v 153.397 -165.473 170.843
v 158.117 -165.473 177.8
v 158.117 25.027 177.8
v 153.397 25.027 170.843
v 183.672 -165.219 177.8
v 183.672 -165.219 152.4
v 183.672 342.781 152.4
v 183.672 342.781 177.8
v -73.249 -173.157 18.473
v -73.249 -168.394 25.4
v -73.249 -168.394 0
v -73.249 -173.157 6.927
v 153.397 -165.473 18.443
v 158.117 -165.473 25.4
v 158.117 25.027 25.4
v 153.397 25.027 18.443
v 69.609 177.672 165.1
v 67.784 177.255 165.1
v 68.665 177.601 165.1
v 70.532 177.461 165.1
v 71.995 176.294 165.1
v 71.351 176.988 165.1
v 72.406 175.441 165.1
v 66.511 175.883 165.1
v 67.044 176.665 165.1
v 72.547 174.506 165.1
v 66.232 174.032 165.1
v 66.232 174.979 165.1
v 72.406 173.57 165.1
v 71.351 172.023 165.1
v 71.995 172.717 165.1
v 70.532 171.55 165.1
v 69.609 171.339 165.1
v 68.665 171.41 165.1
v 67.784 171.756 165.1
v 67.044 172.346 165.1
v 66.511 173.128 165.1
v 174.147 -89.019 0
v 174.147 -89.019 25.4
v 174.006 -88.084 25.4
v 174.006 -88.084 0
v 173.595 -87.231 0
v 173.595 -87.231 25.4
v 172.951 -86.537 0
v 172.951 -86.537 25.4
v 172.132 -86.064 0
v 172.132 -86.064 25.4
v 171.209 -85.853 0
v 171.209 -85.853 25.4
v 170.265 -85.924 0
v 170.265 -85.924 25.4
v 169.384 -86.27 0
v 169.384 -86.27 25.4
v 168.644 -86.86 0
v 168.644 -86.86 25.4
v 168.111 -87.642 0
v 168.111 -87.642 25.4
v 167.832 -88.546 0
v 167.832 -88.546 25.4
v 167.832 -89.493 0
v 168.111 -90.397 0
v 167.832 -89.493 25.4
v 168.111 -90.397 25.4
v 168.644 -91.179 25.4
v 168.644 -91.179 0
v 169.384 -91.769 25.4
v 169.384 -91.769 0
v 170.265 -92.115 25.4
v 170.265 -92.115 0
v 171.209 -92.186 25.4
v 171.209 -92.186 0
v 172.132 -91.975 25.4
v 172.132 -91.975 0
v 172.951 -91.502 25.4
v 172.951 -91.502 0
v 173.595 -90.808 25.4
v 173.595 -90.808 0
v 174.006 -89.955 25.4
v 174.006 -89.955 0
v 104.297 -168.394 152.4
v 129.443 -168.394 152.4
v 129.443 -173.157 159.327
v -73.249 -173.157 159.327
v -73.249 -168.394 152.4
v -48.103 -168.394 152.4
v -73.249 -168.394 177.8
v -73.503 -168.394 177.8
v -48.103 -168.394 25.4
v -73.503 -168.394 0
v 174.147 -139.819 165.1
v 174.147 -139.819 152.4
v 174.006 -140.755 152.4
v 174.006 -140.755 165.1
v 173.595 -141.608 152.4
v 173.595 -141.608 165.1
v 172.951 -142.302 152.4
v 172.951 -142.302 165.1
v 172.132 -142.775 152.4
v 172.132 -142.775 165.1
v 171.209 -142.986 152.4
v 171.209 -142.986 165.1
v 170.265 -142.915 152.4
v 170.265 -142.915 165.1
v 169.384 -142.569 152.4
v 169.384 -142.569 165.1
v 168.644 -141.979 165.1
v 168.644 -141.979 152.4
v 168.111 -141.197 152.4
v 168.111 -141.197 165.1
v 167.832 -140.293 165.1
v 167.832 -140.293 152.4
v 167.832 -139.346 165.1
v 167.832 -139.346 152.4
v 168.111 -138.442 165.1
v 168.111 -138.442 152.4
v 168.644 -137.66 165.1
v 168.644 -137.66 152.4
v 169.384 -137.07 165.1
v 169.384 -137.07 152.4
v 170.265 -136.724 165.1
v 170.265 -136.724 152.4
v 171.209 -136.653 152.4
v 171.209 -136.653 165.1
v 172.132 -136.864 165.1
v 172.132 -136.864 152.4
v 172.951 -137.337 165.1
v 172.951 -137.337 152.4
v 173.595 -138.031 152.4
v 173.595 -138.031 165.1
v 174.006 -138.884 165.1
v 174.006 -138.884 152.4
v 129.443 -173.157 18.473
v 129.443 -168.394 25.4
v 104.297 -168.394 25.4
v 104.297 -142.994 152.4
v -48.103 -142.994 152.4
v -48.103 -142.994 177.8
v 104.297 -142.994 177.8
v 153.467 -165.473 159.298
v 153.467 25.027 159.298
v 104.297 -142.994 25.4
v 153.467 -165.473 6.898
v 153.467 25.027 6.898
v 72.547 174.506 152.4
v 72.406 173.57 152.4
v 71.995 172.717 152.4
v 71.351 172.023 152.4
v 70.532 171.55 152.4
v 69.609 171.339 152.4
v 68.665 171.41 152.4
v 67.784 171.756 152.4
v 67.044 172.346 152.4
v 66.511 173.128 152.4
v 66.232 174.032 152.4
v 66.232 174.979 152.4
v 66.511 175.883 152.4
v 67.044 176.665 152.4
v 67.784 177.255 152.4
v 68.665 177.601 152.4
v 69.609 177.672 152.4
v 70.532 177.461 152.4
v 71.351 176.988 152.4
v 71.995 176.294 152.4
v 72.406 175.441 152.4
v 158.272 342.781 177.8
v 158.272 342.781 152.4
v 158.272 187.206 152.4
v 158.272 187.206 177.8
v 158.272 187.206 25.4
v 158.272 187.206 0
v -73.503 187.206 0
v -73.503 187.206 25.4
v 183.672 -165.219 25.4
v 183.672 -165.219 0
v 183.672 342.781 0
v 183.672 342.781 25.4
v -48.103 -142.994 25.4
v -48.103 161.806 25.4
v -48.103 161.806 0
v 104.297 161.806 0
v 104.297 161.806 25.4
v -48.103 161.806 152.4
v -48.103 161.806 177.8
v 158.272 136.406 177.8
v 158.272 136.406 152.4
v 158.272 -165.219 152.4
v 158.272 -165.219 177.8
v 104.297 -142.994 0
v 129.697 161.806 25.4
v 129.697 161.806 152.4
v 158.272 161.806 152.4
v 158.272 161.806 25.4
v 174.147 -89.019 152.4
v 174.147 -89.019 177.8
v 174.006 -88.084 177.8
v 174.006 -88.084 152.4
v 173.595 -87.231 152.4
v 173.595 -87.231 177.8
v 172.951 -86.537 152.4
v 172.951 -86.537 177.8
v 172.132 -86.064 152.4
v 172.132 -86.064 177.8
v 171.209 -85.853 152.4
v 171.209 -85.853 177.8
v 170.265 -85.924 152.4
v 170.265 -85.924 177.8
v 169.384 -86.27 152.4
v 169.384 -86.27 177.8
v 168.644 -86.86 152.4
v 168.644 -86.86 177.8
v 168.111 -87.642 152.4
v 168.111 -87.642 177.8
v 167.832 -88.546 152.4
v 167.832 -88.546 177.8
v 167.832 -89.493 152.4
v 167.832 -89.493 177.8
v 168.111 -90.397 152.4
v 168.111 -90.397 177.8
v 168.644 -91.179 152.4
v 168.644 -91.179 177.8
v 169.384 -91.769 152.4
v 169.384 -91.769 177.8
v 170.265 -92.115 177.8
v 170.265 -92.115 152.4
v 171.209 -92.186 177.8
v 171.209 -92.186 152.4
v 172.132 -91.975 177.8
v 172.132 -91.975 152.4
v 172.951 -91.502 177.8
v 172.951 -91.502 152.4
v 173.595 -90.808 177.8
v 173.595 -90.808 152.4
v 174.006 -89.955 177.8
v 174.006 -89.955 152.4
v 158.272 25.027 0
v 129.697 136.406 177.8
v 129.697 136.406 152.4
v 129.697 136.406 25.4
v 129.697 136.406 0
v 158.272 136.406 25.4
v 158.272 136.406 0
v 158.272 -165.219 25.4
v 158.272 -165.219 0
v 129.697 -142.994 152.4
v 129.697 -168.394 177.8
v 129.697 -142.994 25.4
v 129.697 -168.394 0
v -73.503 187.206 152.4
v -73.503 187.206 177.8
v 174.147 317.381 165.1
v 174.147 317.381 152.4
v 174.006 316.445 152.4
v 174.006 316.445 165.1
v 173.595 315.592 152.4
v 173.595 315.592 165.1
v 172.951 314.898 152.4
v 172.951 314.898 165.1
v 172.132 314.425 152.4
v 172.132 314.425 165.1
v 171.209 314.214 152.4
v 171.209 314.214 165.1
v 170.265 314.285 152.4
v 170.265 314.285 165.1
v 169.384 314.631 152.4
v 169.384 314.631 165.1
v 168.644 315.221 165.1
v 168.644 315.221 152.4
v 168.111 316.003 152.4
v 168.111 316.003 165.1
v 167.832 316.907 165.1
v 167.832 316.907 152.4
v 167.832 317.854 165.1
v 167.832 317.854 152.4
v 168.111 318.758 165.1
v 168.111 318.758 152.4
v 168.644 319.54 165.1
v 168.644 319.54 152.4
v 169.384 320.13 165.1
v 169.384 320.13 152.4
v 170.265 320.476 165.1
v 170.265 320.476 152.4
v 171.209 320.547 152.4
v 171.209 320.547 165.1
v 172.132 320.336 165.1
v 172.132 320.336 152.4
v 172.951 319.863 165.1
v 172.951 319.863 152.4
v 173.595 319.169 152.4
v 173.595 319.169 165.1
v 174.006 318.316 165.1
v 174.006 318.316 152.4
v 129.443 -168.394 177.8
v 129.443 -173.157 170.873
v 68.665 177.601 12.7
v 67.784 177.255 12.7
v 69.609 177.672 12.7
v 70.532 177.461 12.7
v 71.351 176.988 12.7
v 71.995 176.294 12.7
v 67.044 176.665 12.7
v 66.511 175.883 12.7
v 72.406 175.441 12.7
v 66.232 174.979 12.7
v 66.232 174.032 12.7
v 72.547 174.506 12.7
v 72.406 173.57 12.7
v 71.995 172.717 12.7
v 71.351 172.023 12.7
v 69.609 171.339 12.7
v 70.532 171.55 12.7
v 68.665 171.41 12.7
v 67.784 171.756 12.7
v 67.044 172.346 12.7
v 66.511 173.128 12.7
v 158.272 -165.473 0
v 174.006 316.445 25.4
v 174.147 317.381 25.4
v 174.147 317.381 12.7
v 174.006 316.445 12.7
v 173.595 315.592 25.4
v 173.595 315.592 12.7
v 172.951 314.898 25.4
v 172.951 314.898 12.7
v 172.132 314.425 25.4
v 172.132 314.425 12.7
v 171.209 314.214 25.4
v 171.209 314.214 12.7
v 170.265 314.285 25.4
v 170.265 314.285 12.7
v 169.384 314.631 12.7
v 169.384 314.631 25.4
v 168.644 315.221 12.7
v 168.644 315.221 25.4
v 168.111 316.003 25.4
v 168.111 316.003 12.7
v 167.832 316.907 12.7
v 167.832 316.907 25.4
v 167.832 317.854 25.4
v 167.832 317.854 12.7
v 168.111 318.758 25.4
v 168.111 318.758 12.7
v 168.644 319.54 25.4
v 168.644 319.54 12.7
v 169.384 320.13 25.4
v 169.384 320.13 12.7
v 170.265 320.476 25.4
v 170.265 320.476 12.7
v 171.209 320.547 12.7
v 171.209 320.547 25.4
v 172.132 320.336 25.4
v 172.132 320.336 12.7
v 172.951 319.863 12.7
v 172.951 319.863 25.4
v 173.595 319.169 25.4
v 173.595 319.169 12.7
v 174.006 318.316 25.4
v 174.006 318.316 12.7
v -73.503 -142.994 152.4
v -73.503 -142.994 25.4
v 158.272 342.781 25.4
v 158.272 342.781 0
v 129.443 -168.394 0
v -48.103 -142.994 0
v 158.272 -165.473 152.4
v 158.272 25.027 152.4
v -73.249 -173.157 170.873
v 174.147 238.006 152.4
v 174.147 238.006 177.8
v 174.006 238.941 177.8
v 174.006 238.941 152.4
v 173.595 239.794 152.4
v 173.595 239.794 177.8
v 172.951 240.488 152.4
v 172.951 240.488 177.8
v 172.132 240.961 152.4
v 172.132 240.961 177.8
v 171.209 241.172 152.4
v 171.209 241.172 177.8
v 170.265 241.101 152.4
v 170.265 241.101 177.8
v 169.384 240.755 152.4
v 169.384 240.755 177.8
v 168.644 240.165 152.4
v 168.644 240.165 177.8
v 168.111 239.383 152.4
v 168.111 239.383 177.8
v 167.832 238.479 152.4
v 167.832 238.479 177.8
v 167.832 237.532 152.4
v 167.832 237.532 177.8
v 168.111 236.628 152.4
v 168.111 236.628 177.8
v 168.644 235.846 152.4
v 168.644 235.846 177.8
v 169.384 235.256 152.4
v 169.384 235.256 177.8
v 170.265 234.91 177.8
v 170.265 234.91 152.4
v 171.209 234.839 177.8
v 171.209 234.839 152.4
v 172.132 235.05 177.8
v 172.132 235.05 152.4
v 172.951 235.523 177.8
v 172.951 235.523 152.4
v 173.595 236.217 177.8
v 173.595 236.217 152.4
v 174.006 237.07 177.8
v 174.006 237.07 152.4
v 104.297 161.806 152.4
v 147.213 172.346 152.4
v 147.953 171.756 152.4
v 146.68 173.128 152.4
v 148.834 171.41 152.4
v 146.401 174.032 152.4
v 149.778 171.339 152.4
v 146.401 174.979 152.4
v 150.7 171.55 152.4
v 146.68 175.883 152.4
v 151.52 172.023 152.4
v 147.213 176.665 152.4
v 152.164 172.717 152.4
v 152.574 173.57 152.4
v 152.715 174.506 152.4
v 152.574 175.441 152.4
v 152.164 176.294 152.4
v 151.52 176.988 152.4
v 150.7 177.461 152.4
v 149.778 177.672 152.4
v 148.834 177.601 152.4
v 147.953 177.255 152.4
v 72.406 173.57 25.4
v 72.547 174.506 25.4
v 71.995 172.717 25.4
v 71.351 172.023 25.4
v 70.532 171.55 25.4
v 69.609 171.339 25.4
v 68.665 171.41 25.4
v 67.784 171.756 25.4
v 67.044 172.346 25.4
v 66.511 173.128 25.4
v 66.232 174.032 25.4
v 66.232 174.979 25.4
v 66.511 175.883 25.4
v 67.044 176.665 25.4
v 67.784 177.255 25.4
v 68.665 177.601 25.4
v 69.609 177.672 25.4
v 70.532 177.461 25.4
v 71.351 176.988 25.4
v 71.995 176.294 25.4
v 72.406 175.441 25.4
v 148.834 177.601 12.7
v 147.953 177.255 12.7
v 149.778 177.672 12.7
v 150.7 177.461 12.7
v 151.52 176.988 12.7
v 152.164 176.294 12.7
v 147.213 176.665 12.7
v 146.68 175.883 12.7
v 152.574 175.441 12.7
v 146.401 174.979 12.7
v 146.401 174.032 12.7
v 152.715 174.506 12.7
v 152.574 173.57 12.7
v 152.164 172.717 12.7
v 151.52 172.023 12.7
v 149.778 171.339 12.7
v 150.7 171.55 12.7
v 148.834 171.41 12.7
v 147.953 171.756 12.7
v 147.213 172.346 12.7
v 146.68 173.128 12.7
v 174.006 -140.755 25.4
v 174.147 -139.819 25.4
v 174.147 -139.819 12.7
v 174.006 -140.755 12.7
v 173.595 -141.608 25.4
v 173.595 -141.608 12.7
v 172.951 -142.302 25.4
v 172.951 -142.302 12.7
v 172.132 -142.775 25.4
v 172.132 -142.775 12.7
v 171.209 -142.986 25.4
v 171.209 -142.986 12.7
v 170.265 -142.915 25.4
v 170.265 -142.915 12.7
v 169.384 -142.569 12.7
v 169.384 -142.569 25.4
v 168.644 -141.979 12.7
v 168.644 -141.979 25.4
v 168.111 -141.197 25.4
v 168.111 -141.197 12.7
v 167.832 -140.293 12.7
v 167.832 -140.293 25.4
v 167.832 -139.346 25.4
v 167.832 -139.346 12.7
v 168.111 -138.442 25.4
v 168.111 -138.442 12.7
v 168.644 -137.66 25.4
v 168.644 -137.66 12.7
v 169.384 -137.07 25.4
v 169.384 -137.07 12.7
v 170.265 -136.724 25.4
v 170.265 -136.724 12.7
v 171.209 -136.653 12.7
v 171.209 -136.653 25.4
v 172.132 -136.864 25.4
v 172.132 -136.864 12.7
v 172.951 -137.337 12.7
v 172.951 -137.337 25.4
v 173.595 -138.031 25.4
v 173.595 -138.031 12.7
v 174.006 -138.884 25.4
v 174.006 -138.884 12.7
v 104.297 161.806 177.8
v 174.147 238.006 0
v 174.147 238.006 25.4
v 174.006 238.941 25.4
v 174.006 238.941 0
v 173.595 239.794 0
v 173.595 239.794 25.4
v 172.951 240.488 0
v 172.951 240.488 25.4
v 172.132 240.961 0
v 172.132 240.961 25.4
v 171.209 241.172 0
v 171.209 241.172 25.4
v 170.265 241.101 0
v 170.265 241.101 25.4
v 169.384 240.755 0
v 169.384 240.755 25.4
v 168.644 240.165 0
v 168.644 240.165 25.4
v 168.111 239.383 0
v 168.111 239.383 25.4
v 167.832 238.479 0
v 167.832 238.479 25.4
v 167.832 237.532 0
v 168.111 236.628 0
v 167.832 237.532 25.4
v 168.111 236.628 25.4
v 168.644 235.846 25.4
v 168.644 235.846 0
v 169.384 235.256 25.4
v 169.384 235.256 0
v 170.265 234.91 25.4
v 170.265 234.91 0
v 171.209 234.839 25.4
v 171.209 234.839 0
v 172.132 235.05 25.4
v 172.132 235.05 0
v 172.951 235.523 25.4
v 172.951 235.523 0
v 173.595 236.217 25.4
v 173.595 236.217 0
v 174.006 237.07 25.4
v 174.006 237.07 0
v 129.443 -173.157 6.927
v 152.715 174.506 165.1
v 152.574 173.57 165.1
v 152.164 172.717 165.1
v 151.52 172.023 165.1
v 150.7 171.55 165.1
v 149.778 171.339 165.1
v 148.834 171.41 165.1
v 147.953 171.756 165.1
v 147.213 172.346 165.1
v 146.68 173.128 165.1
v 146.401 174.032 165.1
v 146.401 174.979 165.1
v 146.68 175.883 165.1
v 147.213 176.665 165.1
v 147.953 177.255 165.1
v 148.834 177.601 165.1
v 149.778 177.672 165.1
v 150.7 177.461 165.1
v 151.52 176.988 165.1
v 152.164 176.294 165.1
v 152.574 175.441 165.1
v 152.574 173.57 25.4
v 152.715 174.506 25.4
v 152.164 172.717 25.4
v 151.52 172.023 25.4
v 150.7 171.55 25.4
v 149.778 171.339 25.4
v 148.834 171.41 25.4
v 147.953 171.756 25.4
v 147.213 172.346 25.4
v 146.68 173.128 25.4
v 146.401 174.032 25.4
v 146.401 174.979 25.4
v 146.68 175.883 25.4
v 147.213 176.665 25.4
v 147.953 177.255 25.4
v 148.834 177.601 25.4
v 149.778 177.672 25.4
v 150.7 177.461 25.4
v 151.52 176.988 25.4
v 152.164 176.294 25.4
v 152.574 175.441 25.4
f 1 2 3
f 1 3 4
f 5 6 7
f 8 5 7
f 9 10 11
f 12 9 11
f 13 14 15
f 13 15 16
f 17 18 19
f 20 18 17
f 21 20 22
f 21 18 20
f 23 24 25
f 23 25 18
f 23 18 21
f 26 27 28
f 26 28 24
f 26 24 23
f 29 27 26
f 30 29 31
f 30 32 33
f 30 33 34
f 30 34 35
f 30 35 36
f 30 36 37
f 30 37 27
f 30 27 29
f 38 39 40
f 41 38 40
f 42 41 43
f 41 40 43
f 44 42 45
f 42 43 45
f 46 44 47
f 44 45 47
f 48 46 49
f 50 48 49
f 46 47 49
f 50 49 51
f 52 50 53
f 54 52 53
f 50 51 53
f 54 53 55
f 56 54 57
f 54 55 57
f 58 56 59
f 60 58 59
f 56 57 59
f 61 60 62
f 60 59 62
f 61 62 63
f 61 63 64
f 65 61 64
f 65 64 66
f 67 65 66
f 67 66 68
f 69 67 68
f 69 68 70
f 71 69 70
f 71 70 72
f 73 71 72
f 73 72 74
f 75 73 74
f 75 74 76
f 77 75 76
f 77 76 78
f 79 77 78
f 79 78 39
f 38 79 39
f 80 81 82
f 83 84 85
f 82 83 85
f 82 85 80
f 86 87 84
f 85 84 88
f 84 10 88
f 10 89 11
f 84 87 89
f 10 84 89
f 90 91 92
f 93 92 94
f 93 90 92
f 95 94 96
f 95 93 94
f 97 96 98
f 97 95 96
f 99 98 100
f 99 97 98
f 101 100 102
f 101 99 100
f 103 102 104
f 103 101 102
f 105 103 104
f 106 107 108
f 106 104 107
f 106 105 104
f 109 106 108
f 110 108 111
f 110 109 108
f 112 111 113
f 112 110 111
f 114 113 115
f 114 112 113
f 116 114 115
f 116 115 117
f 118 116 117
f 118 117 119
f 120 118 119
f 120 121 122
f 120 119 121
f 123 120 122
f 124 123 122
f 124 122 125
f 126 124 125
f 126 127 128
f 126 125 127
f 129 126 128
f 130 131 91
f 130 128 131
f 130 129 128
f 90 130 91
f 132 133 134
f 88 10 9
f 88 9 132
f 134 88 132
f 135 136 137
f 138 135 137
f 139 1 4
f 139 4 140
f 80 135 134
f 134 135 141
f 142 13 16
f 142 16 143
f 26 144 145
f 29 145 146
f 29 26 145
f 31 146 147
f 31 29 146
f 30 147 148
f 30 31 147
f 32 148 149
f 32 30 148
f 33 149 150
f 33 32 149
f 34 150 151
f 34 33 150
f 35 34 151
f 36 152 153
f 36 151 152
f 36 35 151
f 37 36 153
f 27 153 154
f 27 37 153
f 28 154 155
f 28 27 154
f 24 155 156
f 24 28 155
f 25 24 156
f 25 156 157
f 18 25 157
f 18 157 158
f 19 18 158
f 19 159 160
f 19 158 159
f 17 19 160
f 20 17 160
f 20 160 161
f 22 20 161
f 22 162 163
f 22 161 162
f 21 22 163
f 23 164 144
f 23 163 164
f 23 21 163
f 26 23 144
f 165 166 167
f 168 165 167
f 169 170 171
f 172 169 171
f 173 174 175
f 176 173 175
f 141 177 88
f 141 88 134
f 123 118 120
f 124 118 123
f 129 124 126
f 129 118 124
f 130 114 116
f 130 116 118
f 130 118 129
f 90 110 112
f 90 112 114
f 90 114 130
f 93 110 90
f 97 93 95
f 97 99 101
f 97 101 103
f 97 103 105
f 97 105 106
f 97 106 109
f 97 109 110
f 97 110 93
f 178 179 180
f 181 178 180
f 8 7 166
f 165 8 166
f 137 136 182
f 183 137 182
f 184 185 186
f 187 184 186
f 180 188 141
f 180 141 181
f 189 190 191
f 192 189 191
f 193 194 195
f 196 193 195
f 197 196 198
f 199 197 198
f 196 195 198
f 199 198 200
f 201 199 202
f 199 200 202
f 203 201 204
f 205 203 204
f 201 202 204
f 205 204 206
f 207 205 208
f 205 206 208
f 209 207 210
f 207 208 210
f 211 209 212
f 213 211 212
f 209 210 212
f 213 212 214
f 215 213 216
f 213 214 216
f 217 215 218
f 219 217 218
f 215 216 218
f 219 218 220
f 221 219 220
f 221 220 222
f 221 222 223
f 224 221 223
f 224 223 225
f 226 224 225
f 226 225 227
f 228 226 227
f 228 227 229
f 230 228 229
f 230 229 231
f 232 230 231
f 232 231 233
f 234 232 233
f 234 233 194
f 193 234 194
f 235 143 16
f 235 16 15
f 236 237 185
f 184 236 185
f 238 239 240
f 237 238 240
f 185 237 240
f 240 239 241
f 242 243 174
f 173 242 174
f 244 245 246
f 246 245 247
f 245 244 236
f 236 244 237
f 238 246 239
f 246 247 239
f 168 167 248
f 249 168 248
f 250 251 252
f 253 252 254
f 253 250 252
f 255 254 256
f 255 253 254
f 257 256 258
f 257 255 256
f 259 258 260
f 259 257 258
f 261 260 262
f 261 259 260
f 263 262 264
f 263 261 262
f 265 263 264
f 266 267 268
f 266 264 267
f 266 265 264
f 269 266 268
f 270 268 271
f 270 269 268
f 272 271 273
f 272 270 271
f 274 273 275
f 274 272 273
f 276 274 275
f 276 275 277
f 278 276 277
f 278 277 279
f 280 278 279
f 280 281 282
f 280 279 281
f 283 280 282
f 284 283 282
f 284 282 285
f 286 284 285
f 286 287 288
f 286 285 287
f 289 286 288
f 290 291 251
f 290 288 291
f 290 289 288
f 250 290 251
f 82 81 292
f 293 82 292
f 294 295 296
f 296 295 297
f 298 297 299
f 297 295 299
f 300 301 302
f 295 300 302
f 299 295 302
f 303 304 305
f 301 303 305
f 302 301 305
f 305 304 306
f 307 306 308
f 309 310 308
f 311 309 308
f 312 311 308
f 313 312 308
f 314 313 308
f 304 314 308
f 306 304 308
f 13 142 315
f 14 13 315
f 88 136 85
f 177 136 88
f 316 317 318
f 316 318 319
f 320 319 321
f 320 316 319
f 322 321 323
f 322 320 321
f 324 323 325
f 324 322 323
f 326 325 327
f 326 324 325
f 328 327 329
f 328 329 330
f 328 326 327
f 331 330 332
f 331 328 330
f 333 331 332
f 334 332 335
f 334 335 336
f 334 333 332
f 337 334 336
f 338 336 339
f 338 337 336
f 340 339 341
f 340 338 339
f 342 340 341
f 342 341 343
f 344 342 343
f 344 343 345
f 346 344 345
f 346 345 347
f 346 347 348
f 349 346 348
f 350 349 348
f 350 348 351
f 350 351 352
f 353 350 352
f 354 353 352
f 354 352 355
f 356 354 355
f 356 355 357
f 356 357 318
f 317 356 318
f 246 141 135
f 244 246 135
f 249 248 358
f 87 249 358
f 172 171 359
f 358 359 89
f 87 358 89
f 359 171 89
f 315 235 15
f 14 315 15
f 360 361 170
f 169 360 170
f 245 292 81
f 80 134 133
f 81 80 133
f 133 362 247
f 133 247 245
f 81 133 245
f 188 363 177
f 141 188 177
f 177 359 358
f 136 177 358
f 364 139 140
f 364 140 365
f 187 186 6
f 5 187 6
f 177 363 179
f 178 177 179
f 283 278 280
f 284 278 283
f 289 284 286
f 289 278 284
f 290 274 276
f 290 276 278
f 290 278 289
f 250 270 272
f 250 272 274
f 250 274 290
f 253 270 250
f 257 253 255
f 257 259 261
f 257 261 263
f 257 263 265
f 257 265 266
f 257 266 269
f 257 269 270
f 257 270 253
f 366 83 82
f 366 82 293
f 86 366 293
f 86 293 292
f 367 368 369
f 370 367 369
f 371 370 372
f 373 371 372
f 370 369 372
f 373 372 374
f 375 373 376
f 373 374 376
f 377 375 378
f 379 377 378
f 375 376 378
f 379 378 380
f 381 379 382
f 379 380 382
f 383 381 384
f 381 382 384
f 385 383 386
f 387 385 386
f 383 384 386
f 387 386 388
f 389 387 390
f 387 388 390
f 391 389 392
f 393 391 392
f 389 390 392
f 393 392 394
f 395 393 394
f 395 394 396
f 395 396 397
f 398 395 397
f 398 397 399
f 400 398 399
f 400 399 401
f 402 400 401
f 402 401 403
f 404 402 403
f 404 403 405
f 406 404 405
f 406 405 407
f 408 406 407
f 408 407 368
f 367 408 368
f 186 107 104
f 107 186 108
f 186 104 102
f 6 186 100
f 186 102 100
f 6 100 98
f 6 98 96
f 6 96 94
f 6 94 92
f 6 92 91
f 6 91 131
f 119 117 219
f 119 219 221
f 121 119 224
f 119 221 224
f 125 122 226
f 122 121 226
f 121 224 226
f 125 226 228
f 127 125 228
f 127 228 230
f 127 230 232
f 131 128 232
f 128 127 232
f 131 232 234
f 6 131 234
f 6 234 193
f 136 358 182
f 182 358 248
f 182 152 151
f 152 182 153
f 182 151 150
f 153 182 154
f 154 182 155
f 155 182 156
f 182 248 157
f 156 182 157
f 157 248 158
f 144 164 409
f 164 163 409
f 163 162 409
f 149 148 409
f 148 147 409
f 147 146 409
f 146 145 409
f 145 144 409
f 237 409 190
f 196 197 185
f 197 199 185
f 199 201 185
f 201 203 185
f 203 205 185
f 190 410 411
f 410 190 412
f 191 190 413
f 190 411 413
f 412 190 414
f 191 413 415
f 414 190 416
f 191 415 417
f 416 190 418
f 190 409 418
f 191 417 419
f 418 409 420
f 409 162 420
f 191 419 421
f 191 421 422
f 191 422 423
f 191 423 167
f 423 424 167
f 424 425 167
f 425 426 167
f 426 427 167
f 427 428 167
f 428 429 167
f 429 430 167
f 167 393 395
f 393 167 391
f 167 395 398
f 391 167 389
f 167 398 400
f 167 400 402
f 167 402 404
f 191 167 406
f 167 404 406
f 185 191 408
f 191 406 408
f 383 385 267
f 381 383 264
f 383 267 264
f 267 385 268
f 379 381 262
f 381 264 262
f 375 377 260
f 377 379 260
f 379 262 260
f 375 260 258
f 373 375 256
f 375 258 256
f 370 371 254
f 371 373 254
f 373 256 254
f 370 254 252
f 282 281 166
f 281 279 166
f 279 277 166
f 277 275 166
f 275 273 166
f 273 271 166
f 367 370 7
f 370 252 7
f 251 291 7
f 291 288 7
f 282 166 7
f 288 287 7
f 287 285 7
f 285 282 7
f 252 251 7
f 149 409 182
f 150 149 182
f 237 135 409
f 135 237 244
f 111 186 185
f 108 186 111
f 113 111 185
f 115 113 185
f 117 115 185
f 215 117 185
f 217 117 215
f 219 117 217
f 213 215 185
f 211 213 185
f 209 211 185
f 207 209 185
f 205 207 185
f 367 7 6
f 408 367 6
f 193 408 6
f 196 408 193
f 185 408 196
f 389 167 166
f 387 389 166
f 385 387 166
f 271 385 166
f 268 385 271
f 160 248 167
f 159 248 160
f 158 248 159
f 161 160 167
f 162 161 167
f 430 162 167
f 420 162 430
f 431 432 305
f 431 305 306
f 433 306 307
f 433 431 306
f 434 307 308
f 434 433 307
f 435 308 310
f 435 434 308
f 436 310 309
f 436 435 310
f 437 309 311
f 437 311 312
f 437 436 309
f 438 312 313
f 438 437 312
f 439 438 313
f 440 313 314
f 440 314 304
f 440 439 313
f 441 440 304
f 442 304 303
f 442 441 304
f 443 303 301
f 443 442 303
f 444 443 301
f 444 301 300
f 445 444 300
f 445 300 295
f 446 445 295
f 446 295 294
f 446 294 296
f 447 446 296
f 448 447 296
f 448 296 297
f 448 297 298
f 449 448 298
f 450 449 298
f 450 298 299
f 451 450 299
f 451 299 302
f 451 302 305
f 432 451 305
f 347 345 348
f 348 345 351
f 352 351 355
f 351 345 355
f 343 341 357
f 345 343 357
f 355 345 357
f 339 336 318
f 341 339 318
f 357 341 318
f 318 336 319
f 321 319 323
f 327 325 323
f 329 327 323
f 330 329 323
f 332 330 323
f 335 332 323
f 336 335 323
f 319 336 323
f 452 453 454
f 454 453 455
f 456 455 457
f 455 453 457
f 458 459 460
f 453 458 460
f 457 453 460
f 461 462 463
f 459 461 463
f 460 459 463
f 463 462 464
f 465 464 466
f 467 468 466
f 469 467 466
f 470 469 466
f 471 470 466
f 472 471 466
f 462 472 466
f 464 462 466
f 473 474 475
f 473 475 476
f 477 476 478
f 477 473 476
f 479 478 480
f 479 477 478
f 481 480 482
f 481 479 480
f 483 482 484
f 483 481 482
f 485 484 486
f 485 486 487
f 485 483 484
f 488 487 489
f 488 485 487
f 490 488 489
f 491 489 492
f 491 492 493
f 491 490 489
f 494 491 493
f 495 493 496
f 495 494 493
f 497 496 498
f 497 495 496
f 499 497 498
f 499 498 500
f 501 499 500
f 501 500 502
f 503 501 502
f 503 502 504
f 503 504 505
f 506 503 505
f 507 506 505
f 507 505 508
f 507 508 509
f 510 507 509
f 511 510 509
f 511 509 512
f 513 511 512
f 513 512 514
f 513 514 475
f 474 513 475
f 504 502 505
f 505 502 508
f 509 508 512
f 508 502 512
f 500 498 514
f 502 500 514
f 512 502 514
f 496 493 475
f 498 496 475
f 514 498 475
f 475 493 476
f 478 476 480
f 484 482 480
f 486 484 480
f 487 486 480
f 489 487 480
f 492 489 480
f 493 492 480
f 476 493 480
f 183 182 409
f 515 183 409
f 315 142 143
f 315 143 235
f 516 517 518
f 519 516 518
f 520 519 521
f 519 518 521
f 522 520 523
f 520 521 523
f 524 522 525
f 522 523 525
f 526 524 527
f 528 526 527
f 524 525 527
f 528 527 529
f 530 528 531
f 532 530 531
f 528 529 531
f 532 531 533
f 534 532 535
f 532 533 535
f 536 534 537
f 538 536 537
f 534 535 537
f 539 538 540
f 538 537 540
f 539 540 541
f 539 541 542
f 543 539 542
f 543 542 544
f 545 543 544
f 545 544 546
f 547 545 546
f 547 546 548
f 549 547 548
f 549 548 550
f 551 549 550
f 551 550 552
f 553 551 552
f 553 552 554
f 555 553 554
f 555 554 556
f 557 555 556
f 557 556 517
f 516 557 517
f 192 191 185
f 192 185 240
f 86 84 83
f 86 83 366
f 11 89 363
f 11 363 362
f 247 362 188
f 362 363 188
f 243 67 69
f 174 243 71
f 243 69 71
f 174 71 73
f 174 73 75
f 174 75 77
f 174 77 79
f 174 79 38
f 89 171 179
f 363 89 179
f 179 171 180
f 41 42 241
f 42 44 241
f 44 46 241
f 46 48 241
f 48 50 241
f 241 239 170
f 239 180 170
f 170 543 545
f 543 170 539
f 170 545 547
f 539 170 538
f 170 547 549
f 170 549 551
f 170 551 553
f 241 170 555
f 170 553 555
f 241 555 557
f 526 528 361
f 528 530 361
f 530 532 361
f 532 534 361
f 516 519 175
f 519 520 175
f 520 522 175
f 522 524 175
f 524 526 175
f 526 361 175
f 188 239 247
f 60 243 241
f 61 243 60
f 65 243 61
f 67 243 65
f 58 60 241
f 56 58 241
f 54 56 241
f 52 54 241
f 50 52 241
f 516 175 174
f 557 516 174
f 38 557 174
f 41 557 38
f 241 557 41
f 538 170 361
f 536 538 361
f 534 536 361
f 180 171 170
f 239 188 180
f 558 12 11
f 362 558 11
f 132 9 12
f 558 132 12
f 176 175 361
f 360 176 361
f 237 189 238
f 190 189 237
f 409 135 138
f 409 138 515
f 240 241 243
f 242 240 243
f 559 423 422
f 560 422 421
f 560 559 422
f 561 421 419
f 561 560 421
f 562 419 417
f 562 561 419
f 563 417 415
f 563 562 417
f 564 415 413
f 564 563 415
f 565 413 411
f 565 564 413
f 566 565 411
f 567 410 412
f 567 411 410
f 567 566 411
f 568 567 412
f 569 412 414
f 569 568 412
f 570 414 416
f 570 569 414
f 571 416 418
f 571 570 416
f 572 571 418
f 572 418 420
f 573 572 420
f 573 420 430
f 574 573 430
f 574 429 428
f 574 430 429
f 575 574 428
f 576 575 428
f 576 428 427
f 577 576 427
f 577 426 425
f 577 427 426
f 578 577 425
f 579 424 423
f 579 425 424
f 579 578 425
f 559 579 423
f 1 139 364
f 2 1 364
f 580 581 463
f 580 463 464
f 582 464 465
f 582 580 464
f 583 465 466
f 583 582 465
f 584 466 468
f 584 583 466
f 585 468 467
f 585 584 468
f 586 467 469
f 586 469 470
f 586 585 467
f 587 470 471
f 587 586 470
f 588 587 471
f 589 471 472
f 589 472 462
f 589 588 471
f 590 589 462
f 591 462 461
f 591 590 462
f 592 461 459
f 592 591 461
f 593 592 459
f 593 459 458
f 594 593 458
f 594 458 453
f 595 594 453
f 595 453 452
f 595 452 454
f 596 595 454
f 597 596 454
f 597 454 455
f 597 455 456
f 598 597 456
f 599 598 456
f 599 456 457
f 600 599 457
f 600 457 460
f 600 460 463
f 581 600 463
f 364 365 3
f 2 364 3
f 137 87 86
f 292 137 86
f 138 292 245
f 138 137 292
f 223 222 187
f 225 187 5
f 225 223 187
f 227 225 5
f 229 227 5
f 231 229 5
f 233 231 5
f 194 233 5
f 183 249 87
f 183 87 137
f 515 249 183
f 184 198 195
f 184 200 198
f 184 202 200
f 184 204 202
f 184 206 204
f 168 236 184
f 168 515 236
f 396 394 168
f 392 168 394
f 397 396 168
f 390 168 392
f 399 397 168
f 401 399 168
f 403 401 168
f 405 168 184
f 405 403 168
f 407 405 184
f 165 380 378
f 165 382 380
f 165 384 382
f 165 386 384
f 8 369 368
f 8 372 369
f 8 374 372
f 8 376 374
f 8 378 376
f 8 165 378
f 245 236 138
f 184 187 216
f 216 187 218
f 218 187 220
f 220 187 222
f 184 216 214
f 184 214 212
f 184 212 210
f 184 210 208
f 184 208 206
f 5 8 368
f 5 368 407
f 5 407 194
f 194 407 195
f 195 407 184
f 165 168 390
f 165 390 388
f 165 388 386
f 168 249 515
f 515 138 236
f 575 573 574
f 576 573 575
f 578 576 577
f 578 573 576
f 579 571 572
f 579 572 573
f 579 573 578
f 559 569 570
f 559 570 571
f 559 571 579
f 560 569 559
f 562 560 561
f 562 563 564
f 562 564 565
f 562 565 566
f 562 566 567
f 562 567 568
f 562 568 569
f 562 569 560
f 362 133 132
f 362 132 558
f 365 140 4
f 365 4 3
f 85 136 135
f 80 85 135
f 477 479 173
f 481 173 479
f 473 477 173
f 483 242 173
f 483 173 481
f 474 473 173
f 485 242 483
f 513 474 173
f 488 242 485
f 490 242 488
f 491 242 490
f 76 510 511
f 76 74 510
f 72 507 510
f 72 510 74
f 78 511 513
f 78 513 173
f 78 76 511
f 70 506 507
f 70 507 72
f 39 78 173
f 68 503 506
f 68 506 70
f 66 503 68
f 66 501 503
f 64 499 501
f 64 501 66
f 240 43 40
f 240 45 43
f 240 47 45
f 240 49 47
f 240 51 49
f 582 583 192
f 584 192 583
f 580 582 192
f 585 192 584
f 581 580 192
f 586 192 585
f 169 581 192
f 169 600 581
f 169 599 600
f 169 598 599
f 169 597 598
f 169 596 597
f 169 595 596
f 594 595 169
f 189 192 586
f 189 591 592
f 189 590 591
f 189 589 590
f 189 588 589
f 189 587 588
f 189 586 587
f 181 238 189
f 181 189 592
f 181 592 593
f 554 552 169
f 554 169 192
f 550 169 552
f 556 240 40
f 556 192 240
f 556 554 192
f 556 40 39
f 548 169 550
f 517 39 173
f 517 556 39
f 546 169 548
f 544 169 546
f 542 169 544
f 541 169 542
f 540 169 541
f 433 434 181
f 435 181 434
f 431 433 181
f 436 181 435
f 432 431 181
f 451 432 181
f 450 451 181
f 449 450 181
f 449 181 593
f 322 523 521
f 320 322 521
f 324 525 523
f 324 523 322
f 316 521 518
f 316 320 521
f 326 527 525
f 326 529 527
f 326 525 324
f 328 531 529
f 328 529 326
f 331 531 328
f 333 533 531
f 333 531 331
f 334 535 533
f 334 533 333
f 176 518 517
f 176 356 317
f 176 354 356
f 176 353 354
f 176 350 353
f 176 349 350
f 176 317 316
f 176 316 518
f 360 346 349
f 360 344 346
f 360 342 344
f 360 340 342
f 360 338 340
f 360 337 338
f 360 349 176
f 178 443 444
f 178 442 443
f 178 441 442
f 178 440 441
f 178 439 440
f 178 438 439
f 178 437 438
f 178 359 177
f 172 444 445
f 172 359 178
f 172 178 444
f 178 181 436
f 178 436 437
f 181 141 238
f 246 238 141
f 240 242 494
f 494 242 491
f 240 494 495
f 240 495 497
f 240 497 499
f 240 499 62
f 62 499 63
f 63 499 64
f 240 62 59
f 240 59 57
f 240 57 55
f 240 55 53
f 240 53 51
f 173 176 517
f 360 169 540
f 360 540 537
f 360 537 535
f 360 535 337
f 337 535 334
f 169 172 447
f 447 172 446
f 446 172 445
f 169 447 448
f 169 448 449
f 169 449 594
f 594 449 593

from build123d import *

# Parameters (mm, degrees)
SKETCH1_W               = 152.4
SKETCH1_H               = 304.8
BOSS_EXTRUDE1_DEPTH     = 177.8
SKETCH2_W               = 231.775
SKETCH2_H               = 127
CUT_EXTRUDE1_DEPTH      = 25.4
SKETCH3_W               = 127
SKETCH3_H               = 304.8
CUT_EXTRUDE2_DEPTH      = 25.4
SKETCH4_W               = 127
SKETCH4_H               = 304.8
CUT_EXTRUDE3_DEPTH      = 25.4
SKETCH5_W               = 152.4
SKETCH5_H               = 127
CUT_EXTRUDE4_DEPTH      = 25.4
SKETCH6_W               = 127
SKETCH6_H               = 508
CUT_EXTRUDE5_DEPTH      = 25.4
CUT_EXTRUDE6_REACH      = 429.606
SKETCH7_R               = 3.175
CUT_EXTRUDE7_DEPTH      = 139.7
CUT_EXTRUDE7_DEPTH_BACK = 12.7
SKETCH8_R               = 3.175
BOSS_EXTRUDE2_START     = -0.254
BOSS_EXTRUDE2_DEPTH     = 202.692
BOSS_EXTRUDE3_START     = 0.254
BOSS_EXTRUDE3_DEPTH     = 190.5
BOSS_EXTRUDE3_2_DEPTH   = 190.5


with BuildPart() as part:
    # Sketch1 → Boss-Extrude1 (new body)
    with BuildSketch(Plane.XY):
        Polygon((-73.503424658, -168.394429721), (129.696575342, -168.394429721), (129.696575342, 136.405570279), (158.271575342, 136.405570279), (158.271575342, -165.219429721), (183.671575342, -165.219429721), (183.671575342, 342.780570279), (158.271575342, 342.780570279), (158.271575342, 187.205570279), (-73.503424658, 187.205570279), align=None)
        with Locations((28.096575342, 9.405570279)):
            Rectangle(SKETCH1_W, SKETCH1_H, mode=Mode.SUBTRACT)
    extrude(amount=BOSS_EXTRUDE1_DEPTH)

    # Sketch2 → Cut-Extrude1 (cut)
    with BuildSketch(Plane(origin=(0, 187.205570279, 0), x_dir=(1, 0, 0), z_dir=(0, 1, 0))):
        with Locations((42.384075342, -88.9)):
            Rectangle(SKETCH2_W, SKETCH2_H)
    extrude(amount=-CUT_EXTRUDE1_DEPTH, mode=Mode.SUBTRACT)

    # Sketch3 → Cut-Extrude2 (cut)
    with BuildSketch(Plane.ZY.offset(73.503424658)):
        with Locations((88.9, 9.405570279)):
            Rectangle(SKETCH3_W, SKETCH3_H)
    extrude(amount=-CUT_EXTRUDE2_DEPTH, mode=Mode.SUBTRACT)

    # Sketch4 → Cut-Extrude3 (cut)
    with BuildSketch(Plane.ZY.offset(-104.296575342)):
        with Locations((88.9, 9.405570279)):
            Rectangle(SKETCH4_W, SKETCH4_H)
    extrude(amount=-CUT_EXTRUDE3_DEPTH, mode=Mode.SUBTRACT)

    # Sketch5 → Cut-Extrude4 (cut)
    with BuildSketch(Plane(origin=(0, -142.994429721, 0), x_dir=(1, 0, 0), z_dir=(0, 1, 0))):
        with Locations((28.096575342, -88.9)):
            Rectangle(SKETCH5_W, SKETCH5_H)
    extrude(amount=-CUT_EXTRUDE4_DEPTH, mode=Mode.SUBTRACT)

    # Sketch6 → Cut-Extrude5 (cut)
    with BuildSketch(Plane(origin=(183.671575342, 0, 0), x_dir=(0, 0, -1), z_dir=(1, 0, 0))):
        with Locations((-88.9, 88.780570279)):
            Rectangle(SKETCH6_W, SKETCH6_H)
    extrude(amount=-CUT_EXTRUDE5_DEPTH, mode=Mode.SUBTRACT)

    # Cut-Extrude6: up to this face of the body (flat: up to its plane)
    cut_extrude6_end = Plane(part.part.faces().sort_by_distance((28.096575342, -162.672202347, 0))[0])
    # Sketch7 → Cut-Extrude6 (cut, up to the picked face)
    with BuildSketch(Plane.XY.offset(177.8), mode=Mode.PRIVATE) as cut_extrude6_sk1:
        with Locations((170.971575342, 238.005570279)):
            Circle(SKETCH7_R)
    cut_extrude6_tool1 = split(extrude(cut_extrude6_sk1.sketch, amount=-CUT_EXTRUDE6_REACH, mode=Mode.PRIVATE), bisect_by=cut_extrude6_end, keep=Keep.BOTH, mode=Mode.PRIVATE)
    # Sketch7 → Cut-Extrude6 (cut, up to the picked face)
    with BuildSketch(Plane.XY.offset(177.8), mode=Mode.PRIVATE) as cut_extrude6_sk2:
        with Locations((170.971575342, -89.019429721)):
            Circle(SKETCH7_R)
    cut_extrude6_tool2 = split(extrude(cut_extrude6_sk2.sketch, amount=-CUT_EXTRUDE6_REACH, mode=Mode.PRIVATE), bisect_by=cut_extrude6_end, keep=Keep.BOTH, mode=Mode.PRIVATE)
    add(cut_extrude6_tool1.solids().sort_by(Axis((170.971575, 238.00557, 177.8), (0, 0, -1)))[0], mode=Mode.SUBTRACT)
    add(cut_extrude6_tool2.solids().sort_by(Axis((170.971575, -89.01943, 177.8), (0, 0, -1)))[0], mode=Mode.SUBTRACT)

    # Sketch8 → Cut-Extrude7 (cut, two sides: drawn at the far end of the back side and taken through both)
    with BuildSketch(Plane(origin=(0, 0, 152.4), x_dir=(-1, 0, 0), z_dir=(0, 0, -1)).offset(-CUT_EXTRUDE7_DEPTH_BACK)):
        with Locations(Location((-69.371575342, 174.505570279, 0), (0, 0, 180))):
            Circle(SKETCH8_R)
        with Locations(Location((-170.971575342, 317.380570279, 0), (0, 0, 180))):
            Circle(SKETCH8_R)
        with Locations(Location((-170.971575342, -139.819429721, 0), (0, 0, 180))):
            Circle(SKETCH8_R)
        with Locations(Location((-149.540325342, 174.505570279, 0), (0, 0, 180))):
            Circle(SKETCH8_R)
    extrude(amount=CUT_EXTRUDE7_DEPTH + CUT_EXTRUDE7_DEPTH_BACK, mode=Mode.SUBTRACT)

    # Sketch10 → Boss-Extrude2 (add)
    with BuildSketch(Plane.ZY.offset(73.503424658).offset(BOSS_EXTRUDE2_START)):
        Polygon((177.8, -168.394429721), (152.4, -168.394429721), (159.327401487, -173.156929721), (170.872598513, -173.156929721), align=None)
    boss_extrude2 = extrude(amount=-BOSS_EXTRUDE2_DEPTH)

    # Mirror1: Boss-Extrude2 across plane
    add(boss_extrude2.mirror(Plane.XY.offset(88.9)))


with BuildPart() as body_2:
    # Sketch11 → Boss-Extrude3 (new body)
    with BuildSketch(Plane.XZ.offset(165.219429721).offset(BOSS_EXTRUDE3_START)):
        Polygon((158.271575342, 152.4), (158.117080653, 177.799530141), (153.39680445, 170.843289046), (153.467027742, 159.298305587), align=None)
    extrude(amount=-BOSS_EXTRUDE3_DEPTH)


with BuildPart() as body_3:
    # Sketch11 → Boss-Extrude3 2 (new body)
    with BuildSketch(Plane.XZ.offset(165.219429721).offset(BOSS_EXTRUDE3_START)):
        Polygon((158.271575342, 0), (158.117080653, 25.399530141), (153.39680445, 18.443289046), (153.467027742, 6.898305587), align=None)
    extrude(amount=-BOSS_EXTRUDE3_2_DEPTH)


solid = Compound([part.part, body_2.part, body_3.part])
